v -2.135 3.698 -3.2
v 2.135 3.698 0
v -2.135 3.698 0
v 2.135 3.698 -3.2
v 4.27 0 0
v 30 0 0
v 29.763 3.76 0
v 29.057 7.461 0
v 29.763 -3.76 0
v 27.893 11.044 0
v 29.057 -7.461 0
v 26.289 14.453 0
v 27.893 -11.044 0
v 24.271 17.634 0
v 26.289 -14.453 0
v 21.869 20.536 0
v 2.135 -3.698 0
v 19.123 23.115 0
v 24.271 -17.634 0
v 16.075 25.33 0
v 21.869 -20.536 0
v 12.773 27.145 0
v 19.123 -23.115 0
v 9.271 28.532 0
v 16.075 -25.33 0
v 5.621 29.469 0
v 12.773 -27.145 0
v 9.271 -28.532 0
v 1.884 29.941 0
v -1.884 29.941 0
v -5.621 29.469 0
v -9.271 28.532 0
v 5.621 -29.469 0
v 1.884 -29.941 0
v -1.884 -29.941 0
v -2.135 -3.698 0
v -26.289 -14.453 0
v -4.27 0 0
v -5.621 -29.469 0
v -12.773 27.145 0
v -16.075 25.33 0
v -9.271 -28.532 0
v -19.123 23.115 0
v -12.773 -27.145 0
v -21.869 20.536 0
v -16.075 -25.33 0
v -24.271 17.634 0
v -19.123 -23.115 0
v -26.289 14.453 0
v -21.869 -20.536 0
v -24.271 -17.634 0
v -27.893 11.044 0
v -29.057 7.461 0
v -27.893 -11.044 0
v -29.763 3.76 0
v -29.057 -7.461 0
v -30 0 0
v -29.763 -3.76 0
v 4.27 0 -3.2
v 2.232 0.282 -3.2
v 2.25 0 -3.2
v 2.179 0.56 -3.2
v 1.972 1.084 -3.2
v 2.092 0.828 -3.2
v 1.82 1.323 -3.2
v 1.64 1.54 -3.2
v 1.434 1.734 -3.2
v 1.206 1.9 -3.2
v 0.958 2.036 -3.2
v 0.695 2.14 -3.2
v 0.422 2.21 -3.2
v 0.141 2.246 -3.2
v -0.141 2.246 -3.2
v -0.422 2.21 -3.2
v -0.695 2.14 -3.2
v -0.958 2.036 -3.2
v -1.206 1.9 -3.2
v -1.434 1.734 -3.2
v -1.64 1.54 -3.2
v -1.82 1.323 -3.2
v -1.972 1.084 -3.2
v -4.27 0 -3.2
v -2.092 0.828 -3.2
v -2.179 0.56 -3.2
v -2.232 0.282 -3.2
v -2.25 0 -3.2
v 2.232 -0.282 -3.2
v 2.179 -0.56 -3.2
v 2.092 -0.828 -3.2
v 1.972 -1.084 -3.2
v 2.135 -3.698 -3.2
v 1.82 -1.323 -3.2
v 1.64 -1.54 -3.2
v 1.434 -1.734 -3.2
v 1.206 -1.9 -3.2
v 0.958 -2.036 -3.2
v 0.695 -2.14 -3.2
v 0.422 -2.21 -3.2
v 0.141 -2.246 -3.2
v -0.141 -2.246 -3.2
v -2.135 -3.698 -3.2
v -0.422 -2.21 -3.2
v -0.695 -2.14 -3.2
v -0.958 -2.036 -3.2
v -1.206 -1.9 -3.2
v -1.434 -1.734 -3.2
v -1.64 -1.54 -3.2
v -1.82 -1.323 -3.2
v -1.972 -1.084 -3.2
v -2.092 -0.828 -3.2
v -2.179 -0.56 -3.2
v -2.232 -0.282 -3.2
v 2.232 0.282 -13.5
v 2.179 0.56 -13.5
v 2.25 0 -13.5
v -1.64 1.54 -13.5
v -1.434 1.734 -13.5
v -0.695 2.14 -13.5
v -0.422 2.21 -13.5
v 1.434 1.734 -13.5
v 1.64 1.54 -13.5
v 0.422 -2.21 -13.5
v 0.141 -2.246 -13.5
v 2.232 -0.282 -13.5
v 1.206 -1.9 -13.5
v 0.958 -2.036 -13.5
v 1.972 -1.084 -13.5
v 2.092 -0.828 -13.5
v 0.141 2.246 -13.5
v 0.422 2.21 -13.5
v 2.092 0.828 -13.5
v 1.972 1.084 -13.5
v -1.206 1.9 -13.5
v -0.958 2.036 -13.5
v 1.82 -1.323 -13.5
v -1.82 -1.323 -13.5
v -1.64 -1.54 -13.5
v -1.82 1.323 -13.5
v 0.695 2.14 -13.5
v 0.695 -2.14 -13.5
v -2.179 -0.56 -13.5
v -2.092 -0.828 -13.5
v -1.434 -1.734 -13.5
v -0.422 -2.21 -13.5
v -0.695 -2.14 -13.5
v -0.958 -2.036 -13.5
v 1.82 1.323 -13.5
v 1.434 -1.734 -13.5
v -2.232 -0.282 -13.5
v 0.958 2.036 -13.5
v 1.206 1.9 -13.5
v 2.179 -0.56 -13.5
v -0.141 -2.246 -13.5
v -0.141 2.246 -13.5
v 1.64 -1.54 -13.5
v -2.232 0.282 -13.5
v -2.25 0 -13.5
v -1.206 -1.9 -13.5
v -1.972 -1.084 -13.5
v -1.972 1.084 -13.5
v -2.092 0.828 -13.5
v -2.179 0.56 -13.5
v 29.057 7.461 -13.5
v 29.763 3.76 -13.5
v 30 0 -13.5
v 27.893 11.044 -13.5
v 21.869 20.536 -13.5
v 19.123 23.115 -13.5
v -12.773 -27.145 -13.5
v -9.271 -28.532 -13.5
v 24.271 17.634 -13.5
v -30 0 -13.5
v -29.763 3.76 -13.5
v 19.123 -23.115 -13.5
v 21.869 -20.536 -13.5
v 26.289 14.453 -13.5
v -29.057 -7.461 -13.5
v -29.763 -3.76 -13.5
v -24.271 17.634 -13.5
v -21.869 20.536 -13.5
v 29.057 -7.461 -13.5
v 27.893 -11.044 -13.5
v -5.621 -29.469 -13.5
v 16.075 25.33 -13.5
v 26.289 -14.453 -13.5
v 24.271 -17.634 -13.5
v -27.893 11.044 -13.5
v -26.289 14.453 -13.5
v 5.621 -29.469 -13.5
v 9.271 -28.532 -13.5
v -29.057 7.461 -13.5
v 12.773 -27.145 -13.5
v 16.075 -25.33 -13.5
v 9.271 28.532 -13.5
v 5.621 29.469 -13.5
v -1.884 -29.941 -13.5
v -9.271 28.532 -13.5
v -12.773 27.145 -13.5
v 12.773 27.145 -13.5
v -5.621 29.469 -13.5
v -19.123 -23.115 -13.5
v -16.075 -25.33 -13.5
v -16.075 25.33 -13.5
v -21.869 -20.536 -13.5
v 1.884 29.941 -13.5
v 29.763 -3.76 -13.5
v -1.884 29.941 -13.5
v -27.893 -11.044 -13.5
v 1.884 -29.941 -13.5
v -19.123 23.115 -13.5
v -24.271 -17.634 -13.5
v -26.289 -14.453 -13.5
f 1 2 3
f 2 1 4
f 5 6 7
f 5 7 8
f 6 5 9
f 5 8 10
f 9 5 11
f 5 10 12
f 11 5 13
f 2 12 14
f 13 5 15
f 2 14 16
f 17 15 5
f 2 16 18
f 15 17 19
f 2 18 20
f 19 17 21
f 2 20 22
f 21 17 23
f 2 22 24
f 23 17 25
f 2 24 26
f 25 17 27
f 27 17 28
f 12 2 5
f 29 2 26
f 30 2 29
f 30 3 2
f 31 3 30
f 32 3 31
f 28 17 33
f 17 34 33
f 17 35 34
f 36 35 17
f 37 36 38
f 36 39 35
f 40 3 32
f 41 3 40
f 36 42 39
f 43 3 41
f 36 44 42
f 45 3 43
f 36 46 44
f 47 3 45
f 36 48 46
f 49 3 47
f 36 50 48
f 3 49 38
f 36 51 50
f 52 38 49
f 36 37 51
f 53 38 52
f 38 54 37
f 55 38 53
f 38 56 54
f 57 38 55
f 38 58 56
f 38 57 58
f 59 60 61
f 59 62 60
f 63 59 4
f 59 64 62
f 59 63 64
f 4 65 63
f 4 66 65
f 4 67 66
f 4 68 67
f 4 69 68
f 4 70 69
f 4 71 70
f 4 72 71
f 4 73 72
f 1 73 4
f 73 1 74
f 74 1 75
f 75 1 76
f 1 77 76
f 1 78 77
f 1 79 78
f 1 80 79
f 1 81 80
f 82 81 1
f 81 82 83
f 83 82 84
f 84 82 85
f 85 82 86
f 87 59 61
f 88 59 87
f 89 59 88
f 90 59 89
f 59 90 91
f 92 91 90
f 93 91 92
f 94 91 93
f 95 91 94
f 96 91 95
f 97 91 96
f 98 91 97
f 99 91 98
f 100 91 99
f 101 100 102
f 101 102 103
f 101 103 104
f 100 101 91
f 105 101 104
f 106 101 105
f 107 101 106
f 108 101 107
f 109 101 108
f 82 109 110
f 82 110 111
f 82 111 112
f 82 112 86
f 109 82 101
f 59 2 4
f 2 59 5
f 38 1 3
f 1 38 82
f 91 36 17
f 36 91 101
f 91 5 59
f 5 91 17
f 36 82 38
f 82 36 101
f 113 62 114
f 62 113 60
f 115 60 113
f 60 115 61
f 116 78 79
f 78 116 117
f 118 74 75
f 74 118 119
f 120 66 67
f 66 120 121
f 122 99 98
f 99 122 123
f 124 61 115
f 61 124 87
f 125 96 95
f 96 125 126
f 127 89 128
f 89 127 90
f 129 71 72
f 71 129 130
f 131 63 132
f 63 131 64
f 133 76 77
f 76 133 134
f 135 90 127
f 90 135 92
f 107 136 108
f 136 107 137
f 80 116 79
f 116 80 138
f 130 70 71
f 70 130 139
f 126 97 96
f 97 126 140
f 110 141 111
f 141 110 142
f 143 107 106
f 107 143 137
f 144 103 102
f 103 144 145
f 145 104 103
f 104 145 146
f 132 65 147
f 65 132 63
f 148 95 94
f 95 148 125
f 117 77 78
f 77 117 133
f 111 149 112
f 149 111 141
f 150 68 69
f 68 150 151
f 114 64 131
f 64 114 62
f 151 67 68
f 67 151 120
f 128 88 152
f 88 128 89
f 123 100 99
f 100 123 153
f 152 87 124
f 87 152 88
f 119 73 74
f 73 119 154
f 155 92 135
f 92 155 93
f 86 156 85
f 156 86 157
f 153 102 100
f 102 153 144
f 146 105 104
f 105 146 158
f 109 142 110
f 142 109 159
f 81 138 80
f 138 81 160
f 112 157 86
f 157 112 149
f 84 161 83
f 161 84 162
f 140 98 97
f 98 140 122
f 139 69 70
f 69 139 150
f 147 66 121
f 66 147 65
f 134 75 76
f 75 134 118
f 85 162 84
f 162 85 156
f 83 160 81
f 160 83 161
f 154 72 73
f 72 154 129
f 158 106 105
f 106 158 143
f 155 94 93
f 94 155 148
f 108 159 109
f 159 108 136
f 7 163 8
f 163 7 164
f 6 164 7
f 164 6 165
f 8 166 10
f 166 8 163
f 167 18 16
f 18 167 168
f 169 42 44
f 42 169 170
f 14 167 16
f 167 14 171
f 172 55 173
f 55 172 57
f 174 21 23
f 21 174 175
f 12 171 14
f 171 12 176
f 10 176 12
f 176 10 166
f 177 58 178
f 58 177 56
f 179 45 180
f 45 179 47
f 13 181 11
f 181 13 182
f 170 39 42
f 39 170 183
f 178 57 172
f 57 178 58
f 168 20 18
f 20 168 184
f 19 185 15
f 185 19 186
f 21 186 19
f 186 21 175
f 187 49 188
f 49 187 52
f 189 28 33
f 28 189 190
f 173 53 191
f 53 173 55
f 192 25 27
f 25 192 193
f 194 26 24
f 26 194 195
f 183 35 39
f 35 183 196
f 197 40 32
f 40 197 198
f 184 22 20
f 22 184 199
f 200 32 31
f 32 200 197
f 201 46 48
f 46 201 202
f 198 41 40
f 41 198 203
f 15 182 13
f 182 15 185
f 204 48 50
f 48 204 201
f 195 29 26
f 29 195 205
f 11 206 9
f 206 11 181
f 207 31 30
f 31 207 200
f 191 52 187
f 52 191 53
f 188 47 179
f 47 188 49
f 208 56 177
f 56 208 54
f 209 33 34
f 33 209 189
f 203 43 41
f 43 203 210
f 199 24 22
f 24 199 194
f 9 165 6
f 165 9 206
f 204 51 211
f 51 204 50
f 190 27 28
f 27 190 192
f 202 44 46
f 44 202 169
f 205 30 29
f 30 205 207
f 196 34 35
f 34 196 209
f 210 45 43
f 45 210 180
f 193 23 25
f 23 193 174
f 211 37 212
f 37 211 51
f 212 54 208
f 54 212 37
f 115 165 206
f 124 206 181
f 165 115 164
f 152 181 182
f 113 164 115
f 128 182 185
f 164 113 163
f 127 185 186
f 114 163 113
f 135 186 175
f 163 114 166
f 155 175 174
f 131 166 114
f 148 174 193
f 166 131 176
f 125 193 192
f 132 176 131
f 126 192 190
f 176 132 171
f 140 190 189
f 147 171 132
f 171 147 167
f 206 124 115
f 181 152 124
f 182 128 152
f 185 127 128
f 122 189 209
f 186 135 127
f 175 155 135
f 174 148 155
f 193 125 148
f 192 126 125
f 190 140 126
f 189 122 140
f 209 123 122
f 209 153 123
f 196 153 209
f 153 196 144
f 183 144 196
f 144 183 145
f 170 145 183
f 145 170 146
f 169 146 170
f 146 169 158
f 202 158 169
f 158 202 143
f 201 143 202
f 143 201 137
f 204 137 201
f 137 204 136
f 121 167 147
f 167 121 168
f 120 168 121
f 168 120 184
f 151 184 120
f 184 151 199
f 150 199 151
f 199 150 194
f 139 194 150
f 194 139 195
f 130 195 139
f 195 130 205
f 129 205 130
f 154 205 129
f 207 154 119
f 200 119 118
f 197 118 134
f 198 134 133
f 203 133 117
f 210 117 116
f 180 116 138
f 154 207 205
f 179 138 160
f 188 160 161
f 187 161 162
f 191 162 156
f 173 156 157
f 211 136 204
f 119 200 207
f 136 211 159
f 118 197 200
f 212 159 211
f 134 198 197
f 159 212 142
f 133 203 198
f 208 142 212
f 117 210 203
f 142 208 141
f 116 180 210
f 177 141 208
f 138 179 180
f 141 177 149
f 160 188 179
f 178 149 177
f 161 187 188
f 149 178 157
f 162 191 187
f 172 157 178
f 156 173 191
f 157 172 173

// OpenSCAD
$fn = 50;

difference() {
	union() {
		translate(v = [0, 0, -13.5]) {
			cylinder(h = 13.5, r = 30.0);
		}
	}
	union() {
		translate(v = [0, 0, 0]) {
			rotate(a = [0, 0, 0]) {
				difference() {
					union() {
						translate(v = [0, 0, -3.2]) {
							linear_extrude(height = 3.2) {
								polygon(points = [[4.2698, 0.0], [2.1349000000000005, 3.697755269078796], [-2.134899999999999, 3.6977552690787965], [-4.2698, 5.228996902999369e-16], [-2.134900000000002, -3.6977552690787956], [2.1348999999999974, -3.697755269078798]]);
							}
						}
					}
					union();
				}
			}
		}
		#translate(v = [0, 0, -100.0]) {
			cylinder(h = 200, r = 2.25);
		}
	}
}
